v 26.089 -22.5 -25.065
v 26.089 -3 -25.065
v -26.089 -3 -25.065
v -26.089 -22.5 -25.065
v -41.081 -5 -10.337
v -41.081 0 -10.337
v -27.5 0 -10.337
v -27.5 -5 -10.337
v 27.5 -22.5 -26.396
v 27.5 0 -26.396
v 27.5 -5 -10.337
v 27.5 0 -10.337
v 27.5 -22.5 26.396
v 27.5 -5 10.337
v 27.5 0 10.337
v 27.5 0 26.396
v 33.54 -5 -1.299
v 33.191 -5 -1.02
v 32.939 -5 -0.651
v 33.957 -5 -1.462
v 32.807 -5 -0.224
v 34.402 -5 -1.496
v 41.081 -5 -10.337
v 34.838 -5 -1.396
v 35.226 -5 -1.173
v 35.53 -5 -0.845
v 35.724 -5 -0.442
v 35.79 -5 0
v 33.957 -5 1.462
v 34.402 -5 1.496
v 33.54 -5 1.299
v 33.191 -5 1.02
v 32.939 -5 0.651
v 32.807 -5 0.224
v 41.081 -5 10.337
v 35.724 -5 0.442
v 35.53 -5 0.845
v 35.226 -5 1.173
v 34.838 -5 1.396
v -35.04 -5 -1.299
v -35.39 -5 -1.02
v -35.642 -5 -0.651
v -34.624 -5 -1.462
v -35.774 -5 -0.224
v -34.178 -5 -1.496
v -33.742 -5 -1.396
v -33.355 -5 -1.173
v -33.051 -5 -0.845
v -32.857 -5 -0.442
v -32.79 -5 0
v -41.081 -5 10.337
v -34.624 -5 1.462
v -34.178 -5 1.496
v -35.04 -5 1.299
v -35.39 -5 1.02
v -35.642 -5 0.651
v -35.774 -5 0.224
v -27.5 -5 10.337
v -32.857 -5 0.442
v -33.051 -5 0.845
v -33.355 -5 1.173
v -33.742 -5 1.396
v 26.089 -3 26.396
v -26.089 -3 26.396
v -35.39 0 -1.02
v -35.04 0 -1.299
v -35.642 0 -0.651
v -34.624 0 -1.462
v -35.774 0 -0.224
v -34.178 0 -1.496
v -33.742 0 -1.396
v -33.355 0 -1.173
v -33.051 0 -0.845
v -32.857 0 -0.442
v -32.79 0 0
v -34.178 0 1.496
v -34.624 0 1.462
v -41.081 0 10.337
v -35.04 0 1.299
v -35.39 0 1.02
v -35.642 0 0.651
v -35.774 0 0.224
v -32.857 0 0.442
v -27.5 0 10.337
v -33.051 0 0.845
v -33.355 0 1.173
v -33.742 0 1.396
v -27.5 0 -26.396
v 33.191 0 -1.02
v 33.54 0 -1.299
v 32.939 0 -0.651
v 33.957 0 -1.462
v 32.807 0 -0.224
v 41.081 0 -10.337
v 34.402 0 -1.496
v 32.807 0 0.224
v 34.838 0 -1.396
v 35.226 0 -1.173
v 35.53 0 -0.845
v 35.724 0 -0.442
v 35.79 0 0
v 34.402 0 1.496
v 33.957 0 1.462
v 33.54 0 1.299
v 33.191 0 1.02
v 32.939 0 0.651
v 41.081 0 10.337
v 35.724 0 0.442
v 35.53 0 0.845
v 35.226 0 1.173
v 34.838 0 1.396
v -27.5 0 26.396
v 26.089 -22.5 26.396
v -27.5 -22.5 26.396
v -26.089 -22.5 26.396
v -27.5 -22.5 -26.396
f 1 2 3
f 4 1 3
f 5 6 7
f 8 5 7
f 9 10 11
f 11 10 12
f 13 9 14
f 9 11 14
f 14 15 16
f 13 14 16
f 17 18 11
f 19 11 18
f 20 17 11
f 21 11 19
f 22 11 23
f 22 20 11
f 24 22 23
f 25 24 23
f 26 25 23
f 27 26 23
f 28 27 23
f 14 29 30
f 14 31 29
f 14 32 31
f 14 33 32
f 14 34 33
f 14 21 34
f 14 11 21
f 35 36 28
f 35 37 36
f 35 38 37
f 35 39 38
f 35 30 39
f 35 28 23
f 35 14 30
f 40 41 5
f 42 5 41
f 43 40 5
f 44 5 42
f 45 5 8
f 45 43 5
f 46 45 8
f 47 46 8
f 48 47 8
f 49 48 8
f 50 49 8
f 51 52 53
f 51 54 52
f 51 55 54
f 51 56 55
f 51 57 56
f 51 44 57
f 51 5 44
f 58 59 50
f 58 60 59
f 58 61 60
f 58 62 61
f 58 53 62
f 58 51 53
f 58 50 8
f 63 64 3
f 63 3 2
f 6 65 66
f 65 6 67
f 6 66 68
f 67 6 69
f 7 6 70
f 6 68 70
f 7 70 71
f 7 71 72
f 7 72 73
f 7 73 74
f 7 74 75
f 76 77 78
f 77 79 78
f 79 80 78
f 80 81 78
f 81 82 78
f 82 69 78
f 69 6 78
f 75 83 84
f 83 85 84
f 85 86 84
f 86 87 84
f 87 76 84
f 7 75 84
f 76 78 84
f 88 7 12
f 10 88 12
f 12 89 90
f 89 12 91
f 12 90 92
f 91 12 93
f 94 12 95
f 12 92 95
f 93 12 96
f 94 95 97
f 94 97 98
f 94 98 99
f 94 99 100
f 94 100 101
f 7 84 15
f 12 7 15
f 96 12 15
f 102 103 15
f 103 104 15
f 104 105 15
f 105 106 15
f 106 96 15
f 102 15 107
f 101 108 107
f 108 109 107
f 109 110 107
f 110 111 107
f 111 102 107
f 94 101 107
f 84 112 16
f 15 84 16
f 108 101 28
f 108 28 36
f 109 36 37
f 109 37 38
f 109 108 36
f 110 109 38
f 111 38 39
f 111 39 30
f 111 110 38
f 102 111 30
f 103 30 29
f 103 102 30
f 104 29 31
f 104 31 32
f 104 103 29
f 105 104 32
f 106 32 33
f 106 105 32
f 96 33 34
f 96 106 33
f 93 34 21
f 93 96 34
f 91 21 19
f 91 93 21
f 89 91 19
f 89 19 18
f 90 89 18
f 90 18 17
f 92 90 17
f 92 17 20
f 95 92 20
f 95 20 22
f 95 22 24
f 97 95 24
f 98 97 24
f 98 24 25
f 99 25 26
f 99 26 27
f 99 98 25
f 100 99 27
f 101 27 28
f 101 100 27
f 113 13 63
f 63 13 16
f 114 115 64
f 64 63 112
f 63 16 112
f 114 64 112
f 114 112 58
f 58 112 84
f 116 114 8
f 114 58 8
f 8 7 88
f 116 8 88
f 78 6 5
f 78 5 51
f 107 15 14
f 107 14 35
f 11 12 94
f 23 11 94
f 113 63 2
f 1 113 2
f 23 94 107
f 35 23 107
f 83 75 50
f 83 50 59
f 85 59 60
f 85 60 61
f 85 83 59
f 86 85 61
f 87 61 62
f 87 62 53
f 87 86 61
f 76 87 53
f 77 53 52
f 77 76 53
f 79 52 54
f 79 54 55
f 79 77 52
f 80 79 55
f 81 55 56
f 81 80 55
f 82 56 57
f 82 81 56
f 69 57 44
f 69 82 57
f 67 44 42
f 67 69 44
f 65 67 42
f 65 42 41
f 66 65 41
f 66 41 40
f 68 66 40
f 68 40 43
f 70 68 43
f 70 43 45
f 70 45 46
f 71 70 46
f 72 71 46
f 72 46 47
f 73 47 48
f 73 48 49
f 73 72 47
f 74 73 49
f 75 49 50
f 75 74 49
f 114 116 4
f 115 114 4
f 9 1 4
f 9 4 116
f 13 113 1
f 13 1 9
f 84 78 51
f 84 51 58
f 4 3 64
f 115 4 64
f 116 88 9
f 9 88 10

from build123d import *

# Parameters (mm, degrees)
F1_DEPTH = 3
F2_DEPTH = 22.5
F0_W     = 13.580743
F0_H     = 20.673372
F0_R     = 1.5
F3_DEPTH = 5


with BuildPart() as f1:
    # F0 (on Front) → F1 (new body)
    with BuildSketch(Plane.XZ):
        Polygon((26.088619, 25.064645), (26.088619, 26.396385), (-26.088619, 26.396385), (-26.088619, 25.064645), (-26.088619, -25.064645), (26.088619, -25.064645), align=None)
    extrude(amount=F1_DEPTH)

    # F0 (on Front) → F2 (join)
    with BuildSketch(Plane.XZ):
        Polygon((-27.5, -26.396385), (27.5, -26.396385), (27.5, -10.336686), (27.5, 10.336686), (27.5, 26.396385), (26.088619, 26.396385), (26.088619, 25.064645), (26.088619, -25.064645), (-26.088619, -25.064645), (-26.088619, 25.064645), (-26.088619, 26.396385), (-27.5, 26.396385), (-27.5, 10.336686), (-27.5, -10.336686), align=None)
    extrude(amount=F2_DEPTH)

    # F0 (on Front) → F3 (join)
    with BuildSketch(Plane.XZ):
        with Locations((-34.290371, 0)):
            Rectangle(F0_W, F0_H)
        with Locations((-34.290372, 0)):
            Circle(F0_R, mode=Mode.SUBTRACT)
        with Locations((34.290371, 0)):
            Rectangle(F0_W, F0_H)
        with Locations((34.290372, 0)):
            Circle(F0_R, mode=Mode.SUBTRACT)
    extrude(amount=F3_DEPTH)


solid = f1.part
